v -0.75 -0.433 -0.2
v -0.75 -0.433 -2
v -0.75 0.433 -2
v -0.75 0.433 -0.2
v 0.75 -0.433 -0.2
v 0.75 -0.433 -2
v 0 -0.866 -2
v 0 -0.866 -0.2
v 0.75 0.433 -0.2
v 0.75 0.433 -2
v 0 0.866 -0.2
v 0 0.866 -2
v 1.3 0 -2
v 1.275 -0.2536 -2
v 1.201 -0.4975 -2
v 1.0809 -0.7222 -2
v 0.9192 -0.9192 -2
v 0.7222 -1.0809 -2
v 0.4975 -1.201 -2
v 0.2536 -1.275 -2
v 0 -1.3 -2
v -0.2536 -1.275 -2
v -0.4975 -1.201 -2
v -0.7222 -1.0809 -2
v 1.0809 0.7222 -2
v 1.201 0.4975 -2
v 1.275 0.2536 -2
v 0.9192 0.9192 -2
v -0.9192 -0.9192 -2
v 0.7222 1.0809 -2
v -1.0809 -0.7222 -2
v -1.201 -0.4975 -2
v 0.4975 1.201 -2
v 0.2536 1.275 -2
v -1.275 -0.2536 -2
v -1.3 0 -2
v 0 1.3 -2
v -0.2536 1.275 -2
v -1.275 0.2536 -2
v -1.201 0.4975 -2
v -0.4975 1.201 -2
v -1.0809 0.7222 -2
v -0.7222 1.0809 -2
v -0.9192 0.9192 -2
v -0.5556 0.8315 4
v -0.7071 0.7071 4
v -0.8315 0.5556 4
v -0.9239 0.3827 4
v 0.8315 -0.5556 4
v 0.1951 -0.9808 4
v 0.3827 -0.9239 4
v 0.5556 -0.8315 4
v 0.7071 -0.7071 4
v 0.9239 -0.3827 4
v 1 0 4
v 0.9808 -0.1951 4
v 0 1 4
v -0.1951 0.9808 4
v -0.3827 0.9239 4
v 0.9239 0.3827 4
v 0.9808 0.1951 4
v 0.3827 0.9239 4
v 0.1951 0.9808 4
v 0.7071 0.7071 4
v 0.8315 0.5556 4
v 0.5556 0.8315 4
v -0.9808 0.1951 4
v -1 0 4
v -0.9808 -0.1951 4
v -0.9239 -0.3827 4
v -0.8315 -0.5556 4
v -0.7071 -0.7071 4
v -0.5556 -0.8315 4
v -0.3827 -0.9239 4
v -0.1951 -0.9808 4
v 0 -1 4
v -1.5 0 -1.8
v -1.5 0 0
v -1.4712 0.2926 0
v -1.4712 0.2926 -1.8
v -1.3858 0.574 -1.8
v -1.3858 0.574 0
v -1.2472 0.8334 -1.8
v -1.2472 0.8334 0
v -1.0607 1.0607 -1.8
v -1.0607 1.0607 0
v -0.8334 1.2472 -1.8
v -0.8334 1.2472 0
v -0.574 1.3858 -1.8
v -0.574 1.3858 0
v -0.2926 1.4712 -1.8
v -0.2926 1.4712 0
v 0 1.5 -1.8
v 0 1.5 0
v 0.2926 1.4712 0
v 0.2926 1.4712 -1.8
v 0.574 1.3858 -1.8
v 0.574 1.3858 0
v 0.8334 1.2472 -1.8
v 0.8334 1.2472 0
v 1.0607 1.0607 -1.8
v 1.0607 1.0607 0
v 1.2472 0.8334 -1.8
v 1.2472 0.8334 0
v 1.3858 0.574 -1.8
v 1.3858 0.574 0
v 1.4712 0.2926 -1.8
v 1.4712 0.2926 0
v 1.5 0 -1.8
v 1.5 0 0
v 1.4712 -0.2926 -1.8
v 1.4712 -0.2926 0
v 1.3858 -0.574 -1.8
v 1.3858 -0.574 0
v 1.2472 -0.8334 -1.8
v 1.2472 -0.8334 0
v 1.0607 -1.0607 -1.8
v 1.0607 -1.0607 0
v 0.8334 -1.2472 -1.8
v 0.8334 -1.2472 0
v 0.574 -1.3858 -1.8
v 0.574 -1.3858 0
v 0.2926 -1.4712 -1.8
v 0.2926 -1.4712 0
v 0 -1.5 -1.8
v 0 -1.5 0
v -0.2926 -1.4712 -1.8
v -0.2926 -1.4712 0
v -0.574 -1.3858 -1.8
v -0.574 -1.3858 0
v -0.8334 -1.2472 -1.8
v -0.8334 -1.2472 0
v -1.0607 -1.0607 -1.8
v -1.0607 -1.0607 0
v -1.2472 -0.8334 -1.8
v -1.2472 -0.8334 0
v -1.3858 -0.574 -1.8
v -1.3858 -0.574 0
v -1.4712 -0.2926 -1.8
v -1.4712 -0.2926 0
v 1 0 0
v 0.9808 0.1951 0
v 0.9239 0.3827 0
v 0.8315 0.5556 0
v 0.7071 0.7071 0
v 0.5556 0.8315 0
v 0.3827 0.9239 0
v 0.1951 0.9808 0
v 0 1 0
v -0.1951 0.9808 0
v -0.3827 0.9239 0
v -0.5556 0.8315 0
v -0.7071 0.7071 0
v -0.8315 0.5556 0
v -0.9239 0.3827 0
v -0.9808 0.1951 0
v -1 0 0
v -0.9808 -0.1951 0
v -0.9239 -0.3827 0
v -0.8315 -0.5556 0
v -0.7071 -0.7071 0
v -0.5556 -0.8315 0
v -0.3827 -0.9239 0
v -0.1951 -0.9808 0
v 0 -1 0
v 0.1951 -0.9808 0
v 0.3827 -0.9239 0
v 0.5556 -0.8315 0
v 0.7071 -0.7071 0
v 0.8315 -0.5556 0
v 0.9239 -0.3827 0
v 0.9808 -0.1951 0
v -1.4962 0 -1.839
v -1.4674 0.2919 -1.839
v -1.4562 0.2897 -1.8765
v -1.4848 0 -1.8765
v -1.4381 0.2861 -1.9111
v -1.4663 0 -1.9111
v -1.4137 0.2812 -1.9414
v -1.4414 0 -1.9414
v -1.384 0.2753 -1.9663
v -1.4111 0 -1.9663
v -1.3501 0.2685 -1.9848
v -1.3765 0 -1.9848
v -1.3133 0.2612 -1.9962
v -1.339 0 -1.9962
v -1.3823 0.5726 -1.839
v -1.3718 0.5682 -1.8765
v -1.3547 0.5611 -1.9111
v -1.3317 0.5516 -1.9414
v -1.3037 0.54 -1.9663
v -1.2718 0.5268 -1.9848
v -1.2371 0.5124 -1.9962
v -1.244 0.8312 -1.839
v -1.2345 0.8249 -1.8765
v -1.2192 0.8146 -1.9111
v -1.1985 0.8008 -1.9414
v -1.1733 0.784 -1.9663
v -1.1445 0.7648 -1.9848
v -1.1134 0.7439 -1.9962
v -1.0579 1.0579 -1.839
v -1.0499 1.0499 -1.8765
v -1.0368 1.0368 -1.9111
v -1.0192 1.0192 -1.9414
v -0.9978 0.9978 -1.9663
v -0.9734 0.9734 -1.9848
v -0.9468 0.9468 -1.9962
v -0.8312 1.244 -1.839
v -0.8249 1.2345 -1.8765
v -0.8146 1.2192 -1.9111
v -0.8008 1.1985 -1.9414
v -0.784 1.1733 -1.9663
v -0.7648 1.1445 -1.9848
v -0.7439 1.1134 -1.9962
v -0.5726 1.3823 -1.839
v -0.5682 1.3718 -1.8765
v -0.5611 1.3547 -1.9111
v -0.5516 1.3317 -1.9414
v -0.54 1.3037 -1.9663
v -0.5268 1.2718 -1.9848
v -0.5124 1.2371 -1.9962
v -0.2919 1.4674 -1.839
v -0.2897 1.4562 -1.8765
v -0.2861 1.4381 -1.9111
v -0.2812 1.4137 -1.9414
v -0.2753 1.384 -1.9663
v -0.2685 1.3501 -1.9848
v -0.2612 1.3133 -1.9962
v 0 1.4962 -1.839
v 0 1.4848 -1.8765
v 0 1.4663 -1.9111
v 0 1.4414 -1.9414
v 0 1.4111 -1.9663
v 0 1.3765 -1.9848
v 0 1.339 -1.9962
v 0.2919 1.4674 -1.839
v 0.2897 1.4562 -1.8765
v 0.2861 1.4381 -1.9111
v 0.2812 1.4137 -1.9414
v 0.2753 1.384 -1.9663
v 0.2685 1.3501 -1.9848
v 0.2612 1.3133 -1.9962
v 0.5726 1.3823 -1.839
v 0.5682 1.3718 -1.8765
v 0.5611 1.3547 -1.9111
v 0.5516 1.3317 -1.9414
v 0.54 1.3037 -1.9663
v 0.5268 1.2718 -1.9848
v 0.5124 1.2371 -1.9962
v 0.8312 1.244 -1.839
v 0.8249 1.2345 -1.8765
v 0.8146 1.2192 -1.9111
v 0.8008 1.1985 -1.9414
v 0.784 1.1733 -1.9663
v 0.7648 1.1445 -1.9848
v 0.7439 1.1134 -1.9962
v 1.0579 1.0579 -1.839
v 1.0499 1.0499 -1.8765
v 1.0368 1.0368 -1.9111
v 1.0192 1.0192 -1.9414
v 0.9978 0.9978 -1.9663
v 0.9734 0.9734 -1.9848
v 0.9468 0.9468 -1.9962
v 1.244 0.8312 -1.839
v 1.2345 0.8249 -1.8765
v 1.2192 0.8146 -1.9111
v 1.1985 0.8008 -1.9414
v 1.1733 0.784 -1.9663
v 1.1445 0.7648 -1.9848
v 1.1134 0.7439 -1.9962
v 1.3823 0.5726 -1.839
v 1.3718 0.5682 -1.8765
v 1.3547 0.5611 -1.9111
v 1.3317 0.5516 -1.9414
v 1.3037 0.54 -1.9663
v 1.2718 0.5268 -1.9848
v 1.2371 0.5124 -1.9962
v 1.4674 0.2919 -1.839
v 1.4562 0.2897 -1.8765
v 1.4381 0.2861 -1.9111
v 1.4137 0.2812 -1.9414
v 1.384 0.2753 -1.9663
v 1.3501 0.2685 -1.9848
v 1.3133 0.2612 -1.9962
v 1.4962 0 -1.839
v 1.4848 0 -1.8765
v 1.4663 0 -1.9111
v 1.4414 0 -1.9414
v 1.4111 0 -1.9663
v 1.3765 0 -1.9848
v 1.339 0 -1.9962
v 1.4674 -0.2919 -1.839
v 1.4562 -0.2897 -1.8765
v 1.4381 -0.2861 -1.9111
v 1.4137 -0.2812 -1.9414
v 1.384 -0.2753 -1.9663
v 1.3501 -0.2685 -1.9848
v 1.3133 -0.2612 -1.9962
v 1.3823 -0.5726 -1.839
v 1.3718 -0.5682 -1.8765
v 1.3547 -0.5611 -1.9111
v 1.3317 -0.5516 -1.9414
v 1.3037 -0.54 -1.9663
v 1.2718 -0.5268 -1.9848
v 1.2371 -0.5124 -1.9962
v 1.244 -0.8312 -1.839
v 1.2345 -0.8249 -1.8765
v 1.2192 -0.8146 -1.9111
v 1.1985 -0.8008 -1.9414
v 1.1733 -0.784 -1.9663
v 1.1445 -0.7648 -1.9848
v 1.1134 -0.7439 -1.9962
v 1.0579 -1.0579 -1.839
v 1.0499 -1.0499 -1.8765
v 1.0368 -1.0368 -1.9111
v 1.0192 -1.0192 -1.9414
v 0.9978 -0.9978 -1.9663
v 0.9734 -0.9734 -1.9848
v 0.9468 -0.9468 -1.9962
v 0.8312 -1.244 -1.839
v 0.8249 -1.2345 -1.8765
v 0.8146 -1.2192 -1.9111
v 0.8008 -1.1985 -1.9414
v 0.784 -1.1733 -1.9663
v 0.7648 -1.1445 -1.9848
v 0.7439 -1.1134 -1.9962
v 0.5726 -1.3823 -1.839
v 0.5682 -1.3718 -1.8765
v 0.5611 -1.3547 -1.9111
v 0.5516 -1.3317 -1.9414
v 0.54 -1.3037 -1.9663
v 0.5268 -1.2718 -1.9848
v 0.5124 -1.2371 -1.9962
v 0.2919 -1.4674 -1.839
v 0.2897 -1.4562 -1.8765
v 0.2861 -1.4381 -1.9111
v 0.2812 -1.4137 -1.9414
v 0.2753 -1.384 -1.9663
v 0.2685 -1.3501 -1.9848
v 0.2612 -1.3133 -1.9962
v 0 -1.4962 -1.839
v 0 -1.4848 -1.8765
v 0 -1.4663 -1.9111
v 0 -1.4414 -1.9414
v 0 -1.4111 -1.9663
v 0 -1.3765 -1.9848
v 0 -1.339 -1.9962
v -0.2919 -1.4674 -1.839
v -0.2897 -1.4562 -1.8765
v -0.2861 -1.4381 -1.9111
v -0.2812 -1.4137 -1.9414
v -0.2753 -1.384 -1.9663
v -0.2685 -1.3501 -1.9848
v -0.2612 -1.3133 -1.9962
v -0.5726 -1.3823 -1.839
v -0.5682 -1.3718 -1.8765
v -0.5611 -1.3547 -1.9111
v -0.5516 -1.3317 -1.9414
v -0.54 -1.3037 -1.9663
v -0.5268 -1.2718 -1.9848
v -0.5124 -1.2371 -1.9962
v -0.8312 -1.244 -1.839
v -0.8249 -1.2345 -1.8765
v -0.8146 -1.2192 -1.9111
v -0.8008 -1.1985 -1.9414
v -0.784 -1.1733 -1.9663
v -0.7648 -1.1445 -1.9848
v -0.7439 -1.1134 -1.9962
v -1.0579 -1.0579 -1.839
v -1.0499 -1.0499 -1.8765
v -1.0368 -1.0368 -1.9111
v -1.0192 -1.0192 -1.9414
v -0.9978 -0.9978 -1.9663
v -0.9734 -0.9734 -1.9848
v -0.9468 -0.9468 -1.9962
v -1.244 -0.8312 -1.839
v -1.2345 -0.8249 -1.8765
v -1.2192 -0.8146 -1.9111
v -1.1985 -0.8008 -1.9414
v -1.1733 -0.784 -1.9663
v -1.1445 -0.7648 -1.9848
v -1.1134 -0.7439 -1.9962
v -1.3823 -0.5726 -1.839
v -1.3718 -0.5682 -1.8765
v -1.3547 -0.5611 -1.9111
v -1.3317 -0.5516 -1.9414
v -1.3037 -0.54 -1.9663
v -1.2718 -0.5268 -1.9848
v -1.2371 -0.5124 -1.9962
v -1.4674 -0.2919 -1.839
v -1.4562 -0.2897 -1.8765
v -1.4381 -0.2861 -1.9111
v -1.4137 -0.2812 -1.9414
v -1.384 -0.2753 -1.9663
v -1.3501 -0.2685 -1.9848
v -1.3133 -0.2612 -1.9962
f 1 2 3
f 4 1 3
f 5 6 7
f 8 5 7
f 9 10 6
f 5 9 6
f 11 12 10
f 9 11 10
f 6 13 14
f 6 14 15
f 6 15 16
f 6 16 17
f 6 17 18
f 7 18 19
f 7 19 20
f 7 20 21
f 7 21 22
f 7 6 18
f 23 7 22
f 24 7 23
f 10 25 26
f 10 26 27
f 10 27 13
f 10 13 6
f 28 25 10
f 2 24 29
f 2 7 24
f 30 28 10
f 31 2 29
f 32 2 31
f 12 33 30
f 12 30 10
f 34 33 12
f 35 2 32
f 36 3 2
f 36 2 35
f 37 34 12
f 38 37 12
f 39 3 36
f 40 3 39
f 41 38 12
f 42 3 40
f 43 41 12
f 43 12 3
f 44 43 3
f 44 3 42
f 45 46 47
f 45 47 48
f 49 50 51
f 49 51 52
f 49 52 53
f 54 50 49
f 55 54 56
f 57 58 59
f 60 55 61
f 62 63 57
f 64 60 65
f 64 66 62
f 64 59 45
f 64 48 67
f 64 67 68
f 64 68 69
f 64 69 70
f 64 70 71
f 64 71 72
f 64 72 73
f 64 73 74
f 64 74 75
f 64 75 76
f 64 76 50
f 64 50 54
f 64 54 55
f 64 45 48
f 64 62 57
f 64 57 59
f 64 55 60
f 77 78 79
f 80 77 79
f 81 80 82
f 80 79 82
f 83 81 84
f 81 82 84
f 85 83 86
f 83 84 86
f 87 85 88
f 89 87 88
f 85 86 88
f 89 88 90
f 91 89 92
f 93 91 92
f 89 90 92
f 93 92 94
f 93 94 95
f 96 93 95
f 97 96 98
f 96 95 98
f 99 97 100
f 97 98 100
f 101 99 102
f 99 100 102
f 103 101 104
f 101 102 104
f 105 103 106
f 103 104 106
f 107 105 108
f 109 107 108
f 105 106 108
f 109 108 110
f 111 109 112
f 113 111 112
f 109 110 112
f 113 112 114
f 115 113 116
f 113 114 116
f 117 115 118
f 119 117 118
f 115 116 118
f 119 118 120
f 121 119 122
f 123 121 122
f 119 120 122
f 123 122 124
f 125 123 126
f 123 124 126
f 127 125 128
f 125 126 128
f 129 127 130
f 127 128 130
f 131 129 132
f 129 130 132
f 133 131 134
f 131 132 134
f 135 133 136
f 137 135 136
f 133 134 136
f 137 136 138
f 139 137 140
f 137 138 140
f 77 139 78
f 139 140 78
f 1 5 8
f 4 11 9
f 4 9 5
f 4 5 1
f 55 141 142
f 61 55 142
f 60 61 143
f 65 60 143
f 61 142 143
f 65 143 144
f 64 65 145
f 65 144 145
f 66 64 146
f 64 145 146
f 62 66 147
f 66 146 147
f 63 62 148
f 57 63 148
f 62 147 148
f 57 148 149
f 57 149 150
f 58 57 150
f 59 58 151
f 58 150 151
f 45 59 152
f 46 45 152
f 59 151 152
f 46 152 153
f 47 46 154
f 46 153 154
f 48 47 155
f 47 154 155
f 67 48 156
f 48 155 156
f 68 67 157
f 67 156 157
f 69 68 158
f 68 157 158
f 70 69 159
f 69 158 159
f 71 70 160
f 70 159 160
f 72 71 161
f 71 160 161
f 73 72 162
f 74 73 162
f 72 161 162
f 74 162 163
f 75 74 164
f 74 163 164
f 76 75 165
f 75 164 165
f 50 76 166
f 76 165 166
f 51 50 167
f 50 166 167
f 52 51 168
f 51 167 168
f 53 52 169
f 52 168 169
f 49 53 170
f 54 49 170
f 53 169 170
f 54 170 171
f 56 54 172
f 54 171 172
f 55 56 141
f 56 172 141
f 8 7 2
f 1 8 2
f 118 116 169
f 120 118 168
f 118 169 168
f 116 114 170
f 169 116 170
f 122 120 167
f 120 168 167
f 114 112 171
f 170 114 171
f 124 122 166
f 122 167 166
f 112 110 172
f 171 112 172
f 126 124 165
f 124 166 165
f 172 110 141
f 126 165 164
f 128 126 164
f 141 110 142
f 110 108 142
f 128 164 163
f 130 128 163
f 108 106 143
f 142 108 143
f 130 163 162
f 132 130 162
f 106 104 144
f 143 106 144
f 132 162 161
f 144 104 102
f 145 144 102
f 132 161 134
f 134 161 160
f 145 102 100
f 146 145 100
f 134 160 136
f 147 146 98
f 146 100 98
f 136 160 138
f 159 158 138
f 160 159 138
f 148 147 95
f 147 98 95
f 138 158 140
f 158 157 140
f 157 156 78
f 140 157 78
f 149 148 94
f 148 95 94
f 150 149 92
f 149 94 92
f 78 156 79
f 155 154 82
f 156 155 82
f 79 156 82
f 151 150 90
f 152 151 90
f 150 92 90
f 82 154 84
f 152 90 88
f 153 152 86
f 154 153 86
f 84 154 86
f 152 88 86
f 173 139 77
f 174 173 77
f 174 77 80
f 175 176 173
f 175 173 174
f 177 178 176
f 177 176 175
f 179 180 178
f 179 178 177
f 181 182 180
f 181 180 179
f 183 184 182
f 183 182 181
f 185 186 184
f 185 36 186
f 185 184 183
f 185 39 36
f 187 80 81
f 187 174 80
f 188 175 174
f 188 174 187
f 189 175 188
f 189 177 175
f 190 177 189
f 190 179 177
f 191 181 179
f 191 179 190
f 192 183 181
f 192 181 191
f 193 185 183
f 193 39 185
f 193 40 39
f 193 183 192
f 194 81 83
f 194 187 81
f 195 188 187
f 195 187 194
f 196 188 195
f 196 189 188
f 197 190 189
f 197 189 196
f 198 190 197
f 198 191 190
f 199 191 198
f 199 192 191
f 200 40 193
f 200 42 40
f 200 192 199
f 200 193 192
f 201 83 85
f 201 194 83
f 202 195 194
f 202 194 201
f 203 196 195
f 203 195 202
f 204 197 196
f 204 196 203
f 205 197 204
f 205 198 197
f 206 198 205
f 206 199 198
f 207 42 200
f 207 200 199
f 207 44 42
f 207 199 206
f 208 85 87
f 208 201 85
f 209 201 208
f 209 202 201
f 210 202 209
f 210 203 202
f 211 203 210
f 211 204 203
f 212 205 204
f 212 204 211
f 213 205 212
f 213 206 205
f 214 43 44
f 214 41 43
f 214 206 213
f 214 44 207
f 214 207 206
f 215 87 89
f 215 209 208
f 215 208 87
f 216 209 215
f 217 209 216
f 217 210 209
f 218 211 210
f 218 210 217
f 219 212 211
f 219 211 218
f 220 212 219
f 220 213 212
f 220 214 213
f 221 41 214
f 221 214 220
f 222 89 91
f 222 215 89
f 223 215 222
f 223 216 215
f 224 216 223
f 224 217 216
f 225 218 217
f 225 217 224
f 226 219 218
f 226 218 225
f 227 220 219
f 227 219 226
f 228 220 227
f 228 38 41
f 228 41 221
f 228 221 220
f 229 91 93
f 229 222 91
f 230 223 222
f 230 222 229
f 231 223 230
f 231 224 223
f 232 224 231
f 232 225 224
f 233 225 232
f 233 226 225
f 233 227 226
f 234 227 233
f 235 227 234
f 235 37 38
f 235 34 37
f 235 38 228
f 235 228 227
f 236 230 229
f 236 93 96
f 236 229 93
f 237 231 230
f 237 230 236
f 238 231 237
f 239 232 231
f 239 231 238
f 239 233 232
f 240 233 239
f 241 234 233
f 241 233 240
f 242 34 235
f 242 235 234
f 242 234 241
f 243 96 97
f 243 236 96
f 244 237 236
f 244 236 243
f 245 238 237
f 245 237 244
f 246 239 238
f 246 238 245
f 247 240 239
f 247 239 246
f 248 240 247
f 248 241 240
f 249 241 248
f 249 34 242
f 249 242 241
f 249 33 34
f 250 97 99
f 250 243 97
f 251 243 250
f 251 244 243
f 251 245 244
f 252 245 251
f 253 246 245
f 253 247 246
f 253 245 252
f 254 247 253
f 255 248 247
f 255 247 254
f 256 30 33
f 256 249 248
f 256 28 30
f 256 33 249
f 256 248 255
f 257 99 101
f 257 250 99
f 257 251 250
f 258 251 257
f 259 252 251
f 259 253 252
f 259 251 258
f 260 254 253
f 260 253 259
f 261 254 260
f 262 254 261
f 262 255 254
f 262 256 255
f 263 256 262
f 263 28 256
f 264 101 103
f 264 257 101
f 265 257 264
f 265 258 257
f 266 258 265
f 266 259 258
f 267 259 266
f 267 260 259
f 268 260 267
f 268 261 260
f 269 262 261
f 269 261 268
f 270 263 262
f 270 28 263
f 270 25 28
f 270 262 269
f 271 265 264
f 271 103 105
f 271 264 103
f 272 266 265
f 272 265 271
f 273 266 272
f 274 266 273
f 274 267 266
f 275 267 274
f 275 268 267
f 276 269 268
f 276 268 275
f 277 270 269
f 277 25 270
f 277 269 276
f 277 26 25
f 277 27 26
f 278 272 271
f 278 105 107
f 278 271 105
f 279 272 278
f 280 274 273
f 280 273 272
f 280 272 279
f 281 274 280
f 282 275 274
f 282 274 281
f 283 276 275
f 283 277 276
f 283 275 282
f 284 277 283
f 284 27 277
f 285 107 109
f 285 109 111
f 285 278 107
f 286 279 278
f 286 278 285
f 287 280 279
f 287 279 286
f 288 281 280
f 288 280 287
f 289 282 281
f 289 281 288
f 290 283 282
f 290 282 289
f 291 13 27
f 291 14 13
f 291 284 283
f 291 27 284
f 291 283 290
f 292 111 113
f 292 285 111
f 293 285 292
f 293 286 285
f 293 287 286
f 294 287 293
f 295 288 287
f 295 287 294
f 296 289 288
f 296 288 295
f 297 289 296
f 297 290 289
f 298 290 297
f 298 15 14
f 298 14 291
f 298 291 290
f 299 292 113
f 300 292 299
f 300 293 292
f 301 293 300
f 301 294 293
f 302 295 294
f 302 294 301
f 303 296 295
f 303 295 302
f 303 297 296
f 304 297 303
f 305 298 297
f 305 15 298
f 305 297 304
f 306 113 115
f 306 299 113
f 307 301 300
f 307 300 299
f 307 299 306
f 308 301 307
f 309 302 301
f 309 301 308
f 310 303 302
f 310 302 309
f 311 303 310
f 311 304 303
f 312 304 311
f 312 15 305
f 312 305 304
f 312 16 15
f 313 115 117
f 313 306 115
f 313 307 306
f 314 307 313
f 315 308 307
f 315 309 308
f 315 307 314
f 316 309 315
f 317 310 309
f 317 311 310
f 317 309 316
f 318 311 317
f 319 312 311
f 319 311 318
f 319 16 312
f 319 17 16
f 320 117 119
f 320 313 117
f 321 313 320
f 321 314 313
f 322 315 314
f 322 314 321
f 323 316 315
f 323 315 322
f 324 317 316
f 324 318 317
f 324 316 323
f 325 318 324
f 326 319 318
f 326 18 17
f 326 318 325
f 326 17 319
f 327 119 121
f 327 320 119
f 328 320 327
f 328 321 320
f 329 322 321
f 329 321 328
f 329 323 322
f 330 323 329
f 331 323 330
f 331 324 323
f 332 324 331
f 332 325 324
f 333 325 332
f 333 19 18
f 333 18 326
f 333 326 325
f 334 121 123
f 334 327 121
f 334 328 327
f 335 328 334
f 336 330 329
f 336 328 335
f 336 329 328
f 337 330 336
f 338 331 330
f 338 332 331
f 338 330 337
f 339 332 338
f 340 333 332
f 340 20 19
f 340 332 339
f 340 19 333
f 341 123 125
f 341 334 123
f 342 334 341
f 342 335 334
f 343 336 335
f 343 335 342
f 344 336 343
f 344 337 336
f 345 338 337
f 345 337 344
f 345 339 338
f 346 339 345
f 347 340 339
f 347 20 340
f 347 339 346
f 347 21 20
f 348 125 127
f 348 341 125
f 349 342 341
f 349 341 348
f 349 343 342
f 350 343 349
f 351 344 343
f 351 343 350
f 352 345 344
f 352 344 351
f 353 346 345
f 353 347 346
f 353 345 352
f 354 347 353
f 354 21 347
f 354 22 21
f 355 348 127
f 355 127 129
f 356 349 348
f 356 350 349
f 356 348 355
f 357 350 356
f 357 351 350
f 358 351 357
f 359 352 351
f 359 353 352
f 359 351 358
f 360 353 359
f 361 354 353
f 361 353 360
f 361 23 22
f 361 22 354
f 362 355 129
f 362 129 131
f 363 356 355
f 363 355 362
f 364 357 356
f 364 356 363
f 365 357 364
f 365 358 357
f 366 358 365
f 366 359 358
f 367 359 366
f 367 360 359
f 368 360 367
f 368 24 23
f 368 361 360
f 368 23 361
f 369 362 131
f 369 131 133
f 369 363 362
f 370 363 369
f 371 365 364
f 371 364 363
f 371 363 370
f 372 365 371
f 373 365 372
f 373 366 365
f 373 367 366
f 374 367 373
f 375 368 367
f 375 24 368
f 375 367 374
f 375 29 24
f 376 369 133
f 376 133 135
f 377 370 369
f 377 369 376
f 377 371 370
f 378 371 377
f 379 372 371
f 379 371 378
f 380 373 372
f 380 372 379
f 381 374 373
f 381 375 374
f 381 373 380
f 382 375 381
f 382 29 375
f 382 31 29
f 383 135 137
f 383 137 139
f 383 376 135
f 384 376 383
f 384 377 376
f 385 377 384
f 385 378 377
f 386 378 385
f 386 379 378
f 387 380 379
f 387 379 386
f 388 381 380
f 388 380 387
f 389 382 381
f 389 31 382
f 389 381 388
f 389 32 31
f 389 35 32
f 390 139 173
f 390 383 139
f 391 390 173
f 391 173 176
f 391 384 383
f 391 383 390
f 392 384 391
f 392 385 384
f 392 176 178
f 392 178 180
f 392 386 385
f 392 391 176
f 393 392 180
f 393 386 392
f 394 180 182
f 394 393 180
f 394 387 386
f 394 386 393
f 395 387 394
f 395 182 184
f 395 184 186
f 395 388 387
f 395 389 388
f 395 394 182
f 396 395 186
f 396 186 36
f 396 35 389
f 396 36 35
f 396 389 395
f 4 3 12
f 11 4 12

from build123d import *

# Parameters (mm, degrees)
SKETCH1_R           = 1
BOSS_EXTRUDE1_DEPTH = 4
SKETCH2_R           = 1.5
BOSS_EXTRUDE2_DEPTH = 2
FILLET1_R           = 0.2
CUT_EXTRUDE1_DEPTH  = 1.8


with BuildPart() as part:
    # Sketch1 → Boss-Extrude1 (new body)
    with BuildSketch(Plane.XY):
        Circle(SKETCH1_R)
    extrude(amount=BOSS_EXTRUDE1_DEPTH)

    # Sketch2 → Boss-Extrude2 (add)
    with BuildSketch(Plane(origin=(0, 0, 0), x_dir=(-1, 0, 0), z_dir=(0, 0, -1))):
        Circle(SKETCH2_R)
    extrude(amount=BOSS_EXTRUDE2_DEPTH)

    # Fillet1
    fillet1_edges = [part.edges().sort_by_distance(p)[0] for p in [
        (1.5, 0, -2),
    ]]
    fillet(fillet1_edges, radius=FILLET1_R)

    # Sketch3 → Cut-Extrude1 (cut)
    with BuildSketch(Plane(origin=(0, 0, -2), x_dir=(-1, 0, 0), z_dir=(0, 0, -1))):
        Polygon((0, -0.866025404), (0.75, -0.433012702), (0.75, 0.433012702), (0, 0.866025404), (-0.75, 0.433012702), (-0.75, -0.433012702), align=None)
    extrude(amount=-CUT_EXTRUDE1_DEPTH, mode=Mode.SUBTRACT)


solid = part.part
